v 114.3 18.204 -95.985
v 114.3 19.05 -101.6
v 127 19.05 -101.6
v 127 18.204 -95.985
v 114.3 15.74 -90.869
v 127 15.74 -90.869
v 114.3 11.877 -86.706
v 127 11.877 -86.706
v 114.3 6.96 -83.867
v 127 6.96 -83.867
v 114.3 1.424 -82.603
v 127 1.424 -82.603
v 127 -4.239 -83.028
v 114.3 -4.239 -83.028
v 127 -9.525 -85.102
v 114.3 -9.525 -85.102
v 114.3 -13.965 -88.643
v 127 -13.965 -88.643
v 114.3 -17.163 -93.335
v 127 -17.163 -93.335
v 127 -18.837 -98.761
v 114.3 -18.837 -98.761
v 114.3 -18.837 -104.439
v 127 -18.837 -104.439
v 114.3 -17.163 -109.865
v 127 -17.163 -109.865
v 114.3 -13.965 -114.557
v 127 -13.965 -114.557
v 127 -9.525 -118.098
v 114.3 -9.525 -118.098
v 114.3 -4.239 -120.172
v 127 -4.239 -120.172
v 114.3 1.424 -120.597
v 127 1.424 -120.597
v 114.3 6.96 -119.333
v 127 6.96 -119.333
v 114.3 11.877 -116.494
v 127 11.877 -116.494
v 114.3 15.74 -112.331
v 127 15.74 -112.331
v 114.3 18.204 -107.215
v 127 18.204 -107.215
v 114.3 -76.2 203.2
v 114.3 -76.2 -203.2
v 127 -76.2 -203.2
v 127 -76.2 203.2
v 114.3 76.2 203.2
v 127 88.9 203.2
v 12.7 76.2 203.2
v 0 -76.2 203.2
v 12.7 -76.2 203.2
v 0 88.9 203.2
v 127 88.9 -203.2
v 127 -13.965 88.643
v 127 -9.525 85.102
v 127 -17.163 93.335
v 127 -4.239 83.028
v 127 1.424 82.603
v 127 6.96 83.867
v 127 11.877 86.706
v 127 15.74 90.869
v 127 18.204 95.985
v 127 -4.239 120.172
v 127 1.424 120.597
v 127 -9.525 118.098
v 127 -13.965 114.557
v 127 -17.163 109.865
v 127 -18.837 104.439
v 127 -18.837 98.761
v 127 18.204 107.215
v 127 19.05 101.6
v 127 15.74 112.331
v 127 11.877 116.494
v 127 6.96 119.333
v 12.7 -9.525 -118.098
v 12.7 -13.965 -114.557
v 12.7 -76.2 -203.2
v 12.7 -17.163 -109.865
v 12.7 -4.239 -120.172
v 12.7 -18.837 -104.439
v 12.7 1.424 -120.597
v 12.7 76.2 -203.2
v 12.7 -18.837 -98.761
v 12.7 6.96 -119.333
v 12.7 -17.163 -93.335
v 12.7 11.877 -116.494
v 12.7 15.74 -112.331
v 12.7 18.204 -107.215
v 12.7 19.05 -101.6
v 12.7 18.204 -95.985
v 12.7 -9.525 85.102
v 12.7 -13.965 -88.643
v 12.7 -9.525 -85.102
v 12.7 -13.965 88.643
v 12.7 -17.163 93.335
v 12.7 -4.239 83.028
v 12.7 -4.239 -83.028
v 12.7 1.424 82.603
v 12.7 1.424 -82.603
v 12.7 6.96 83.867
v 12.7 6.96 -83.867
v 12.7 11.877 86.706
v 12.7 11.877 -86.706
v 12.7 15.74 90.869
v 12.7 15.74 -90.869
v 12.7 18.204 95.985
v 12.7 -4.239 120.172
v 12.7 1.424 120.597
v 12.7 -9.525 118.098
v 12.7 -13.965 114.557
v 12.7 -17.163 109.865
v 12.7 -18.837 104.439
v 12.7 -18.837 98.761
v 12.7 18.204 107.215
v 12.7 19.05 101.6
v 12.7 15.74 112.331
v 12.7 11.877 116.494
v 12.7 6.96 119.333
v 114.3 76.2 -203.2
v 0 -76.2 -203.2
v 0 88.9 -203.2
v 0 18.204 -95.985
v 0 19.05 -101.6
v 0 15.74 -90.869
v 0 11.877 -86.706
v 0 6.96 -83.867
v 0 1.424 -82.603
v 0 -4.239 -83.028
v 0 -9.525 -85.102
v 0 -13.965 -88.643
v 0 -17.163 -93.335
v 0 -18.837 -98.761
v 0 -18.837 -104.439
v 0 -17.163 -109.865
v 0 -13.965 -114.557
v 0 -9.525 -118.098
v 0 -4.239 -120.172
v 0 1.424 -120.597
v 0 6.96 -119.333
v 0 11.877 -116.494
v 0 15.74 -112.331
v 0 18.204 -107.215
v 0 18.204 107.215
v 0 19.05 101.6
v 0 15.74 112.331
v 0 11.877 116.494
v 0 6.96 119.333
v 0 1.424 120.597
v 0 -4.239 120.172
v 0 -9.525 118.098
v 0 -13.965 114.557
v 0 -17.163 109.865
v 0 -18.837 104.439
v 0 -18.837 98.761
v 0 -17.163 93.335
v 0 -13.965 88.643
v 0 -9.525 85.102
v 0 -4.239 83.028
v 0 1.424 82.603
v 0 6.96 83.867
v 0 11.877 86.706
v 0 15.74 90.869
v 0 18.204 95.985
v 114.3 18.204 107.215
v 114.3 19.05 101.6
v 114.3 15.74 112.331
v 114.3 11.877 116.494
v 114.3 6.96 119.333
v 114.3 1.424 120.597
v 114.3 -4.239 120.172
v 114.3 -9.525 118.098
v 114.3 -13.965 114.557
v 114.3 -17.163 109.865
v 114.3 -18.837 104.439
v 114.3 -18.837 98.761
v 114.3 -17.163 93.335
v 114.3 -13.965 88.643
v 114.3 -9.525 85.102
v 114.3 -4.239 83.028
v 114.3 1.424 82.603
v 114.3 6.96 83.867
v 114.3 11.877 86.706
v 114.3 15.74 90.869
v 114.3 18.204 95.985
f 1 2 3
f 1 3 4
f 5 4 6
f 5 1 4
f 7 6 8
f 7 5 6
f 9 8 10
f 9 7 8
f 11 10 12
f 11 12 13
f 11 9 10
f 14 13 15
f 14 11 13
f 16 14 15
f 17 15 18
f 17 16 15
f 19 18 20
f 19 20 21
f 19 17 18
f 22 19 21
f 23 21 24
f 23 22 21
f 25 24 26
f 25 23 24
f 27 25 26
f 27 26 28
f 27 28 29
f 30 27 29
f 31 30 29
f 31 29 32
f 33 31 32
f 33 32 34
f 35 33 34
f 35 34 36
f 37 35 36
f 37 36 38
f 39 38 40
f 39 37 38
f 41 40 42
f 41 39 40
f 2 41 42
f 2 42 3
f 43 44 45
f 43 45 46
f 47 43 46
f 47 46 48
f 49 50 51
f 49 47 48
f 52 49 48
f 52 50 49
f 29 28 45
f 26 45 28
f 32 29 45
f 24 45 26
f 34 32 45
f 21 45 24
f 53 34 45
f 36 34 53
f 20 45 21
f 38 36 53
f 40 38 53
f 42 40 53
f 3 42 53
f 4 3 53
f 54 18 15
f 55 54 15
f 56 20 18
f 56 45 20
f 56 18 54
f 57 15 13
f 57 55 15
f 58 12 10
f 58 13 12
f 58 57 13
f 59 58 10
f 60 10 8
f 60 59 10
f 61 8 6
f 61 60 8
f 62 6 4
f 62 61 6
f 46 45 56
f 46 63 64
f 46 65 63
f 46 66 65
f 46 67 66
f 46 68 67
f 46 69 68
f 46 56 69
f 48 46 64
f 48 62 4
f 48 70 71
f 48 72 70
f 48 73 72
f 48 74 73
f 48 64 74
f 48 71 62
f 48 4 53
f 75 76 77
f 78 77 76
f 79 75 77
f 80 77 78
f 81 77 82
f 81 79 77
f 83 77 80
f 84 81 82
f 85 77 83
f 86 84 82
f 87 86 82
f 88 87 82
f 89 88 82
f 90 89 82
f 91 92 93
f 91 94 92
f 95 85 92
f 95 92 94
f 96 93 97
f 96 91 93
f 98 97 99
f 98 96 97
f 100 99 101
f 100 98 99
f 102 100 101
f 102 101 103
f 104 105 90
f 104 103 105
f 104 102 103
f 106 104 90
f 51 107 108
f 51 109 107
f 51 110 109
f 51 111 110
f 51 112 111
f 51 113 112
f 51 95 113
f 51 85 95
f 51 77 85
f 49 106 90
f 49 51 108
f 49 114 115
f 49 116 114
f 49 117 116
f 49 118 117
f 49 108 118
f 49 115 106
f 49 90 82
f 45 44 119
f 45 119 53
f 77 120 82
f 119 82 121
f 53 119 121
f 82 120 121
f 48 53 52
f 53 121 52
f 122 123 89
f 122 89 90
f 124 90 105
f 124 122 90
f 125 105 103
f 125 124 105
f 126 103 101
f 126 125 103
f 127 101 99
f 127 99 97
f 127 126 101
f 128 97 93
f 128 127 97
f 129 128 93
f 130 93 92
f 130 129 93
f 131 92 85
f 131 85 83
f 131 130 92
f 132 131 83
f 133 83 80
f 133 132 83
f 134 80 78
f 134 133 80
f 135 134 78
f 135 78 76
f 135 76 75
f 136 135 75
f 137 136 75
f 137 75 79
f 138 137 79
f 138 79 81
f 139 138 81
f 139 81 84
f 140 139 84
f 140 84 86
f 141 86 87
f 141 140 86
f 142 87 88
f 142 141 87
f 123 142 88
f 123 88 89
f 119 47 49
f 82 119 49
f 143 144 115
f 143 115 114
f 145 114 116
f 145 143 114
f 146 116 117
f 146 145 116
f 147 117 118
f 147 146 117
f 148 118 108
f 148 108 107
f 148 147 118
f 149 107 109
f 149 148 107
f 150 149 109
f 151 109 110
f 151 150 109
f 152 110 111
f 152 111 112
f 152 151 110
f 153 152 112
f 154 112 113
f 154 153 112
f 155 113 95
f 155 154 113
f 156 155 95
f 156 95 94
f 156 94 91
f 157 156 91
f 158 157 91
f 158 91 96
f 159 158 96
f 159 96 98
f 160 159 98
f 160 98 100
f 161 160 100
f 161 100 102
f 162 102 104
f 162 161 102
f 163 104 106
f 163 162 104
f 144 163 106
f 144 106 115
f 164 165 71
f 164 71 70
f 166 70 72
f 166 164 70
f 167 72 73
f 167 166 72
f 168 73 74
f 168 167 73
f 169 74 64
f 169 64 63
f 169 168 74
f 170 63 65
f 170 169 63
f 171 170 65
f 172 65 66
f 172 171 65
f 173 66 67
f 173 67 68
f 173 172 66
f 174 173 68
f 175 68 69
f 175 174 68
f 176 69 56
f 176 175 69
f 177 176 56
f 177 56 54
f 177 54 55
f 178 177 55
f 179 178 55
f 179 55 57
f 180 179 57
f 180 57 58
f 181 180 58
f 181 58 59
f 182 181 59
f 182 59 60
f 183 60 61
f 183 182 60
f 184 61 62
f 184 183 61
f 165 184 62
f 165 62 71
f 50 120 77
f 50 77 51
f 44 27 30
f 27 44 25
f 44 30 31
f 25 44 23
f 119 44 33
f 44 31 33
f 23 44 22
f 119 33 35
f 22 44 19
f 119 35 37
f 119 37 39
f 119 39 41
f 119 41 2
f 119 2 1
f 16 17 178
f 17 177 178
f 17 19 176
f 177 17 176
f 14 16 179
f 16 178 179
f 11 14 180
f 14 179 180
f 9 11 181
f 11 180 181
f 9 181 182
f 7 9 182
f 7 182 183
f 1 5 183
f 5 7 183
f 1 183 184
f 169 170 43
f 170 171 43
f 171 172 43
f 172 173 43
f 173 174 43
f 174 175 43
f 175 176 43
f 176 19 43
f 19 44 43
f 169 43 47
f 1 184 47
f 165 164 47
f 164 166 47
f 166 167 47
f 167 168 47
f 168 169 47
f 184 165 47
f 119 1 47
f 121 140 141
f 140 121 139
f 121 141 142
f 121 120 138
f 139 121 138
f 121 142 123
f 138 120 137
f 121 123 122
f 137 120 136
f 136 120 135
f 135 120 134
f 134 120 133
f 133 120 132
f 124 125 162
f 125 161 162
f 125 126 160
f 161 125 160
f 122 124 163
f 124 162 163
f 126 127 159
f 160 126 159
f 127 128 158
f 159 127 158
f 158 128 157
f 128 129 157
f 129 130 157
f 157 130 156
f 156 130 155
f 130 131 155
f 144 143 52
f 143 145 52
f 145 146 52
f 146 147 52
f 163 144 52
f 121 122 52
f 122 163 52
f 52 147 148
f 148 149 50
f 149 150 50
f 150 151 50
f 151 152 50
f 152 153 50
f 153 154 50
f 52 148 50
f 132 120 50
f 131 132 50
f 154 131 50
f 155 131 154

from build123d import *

# Parameters (mm, degrees)
F0_W     = 152.4
F0_H     = 406.4
F0_R     = 19.05
F1_DEPTH = 12.7
F2_W     = 114.3
F2_H     = 406.4
F3_DEPTH = 12.7
F5_W     = 165.1
F5_H     = 406.4
F5_R     = 19.05
F6_DEPTH = 12.7


with BuildPart() as f1:
    # F0 (on Right) → F1 (new body)
    with BuildSketch(Plane.YZ):
        Rectangle(F0_W, F0_H)
        with Locations((0, -101.6)):
            Circle(F0_R, mode=Mode.SUBTRACT)
        with Locations((0, 101.6)):
            Circle(F0_R, mode=Mode.SUBTRACT)
    extrude(amount=F1_DEPTH)

    # F2 (on face) → F3 (join)
    with BuildSketch(Plane(origin=(0, 76.2, 0), x_dir=(-1, 0, 0), z_dir=(0, 1, 0))):
        with Locations((-57.15, 0)):
            Rectangle(F2_W, F2_H)
    extrude(amount=F3_DEPTH)

    # F5 (on face) → F6 (join)
    with BuildSketch(Plane.YZ.offset(114.3)):
        with Locations((6.35, 0)):
            Rectangle(F5_W, F5_H)
        with Locations((0, -101.6)):
            Circle(F5_R, mode=Mode.SUBTRACT)
        with Locations((0, 101.6)):
            Circle(F5_R, mode=Mode.SUBTRACT)
    extrude(amount=F6_DEPTH)


solid = f1.part
